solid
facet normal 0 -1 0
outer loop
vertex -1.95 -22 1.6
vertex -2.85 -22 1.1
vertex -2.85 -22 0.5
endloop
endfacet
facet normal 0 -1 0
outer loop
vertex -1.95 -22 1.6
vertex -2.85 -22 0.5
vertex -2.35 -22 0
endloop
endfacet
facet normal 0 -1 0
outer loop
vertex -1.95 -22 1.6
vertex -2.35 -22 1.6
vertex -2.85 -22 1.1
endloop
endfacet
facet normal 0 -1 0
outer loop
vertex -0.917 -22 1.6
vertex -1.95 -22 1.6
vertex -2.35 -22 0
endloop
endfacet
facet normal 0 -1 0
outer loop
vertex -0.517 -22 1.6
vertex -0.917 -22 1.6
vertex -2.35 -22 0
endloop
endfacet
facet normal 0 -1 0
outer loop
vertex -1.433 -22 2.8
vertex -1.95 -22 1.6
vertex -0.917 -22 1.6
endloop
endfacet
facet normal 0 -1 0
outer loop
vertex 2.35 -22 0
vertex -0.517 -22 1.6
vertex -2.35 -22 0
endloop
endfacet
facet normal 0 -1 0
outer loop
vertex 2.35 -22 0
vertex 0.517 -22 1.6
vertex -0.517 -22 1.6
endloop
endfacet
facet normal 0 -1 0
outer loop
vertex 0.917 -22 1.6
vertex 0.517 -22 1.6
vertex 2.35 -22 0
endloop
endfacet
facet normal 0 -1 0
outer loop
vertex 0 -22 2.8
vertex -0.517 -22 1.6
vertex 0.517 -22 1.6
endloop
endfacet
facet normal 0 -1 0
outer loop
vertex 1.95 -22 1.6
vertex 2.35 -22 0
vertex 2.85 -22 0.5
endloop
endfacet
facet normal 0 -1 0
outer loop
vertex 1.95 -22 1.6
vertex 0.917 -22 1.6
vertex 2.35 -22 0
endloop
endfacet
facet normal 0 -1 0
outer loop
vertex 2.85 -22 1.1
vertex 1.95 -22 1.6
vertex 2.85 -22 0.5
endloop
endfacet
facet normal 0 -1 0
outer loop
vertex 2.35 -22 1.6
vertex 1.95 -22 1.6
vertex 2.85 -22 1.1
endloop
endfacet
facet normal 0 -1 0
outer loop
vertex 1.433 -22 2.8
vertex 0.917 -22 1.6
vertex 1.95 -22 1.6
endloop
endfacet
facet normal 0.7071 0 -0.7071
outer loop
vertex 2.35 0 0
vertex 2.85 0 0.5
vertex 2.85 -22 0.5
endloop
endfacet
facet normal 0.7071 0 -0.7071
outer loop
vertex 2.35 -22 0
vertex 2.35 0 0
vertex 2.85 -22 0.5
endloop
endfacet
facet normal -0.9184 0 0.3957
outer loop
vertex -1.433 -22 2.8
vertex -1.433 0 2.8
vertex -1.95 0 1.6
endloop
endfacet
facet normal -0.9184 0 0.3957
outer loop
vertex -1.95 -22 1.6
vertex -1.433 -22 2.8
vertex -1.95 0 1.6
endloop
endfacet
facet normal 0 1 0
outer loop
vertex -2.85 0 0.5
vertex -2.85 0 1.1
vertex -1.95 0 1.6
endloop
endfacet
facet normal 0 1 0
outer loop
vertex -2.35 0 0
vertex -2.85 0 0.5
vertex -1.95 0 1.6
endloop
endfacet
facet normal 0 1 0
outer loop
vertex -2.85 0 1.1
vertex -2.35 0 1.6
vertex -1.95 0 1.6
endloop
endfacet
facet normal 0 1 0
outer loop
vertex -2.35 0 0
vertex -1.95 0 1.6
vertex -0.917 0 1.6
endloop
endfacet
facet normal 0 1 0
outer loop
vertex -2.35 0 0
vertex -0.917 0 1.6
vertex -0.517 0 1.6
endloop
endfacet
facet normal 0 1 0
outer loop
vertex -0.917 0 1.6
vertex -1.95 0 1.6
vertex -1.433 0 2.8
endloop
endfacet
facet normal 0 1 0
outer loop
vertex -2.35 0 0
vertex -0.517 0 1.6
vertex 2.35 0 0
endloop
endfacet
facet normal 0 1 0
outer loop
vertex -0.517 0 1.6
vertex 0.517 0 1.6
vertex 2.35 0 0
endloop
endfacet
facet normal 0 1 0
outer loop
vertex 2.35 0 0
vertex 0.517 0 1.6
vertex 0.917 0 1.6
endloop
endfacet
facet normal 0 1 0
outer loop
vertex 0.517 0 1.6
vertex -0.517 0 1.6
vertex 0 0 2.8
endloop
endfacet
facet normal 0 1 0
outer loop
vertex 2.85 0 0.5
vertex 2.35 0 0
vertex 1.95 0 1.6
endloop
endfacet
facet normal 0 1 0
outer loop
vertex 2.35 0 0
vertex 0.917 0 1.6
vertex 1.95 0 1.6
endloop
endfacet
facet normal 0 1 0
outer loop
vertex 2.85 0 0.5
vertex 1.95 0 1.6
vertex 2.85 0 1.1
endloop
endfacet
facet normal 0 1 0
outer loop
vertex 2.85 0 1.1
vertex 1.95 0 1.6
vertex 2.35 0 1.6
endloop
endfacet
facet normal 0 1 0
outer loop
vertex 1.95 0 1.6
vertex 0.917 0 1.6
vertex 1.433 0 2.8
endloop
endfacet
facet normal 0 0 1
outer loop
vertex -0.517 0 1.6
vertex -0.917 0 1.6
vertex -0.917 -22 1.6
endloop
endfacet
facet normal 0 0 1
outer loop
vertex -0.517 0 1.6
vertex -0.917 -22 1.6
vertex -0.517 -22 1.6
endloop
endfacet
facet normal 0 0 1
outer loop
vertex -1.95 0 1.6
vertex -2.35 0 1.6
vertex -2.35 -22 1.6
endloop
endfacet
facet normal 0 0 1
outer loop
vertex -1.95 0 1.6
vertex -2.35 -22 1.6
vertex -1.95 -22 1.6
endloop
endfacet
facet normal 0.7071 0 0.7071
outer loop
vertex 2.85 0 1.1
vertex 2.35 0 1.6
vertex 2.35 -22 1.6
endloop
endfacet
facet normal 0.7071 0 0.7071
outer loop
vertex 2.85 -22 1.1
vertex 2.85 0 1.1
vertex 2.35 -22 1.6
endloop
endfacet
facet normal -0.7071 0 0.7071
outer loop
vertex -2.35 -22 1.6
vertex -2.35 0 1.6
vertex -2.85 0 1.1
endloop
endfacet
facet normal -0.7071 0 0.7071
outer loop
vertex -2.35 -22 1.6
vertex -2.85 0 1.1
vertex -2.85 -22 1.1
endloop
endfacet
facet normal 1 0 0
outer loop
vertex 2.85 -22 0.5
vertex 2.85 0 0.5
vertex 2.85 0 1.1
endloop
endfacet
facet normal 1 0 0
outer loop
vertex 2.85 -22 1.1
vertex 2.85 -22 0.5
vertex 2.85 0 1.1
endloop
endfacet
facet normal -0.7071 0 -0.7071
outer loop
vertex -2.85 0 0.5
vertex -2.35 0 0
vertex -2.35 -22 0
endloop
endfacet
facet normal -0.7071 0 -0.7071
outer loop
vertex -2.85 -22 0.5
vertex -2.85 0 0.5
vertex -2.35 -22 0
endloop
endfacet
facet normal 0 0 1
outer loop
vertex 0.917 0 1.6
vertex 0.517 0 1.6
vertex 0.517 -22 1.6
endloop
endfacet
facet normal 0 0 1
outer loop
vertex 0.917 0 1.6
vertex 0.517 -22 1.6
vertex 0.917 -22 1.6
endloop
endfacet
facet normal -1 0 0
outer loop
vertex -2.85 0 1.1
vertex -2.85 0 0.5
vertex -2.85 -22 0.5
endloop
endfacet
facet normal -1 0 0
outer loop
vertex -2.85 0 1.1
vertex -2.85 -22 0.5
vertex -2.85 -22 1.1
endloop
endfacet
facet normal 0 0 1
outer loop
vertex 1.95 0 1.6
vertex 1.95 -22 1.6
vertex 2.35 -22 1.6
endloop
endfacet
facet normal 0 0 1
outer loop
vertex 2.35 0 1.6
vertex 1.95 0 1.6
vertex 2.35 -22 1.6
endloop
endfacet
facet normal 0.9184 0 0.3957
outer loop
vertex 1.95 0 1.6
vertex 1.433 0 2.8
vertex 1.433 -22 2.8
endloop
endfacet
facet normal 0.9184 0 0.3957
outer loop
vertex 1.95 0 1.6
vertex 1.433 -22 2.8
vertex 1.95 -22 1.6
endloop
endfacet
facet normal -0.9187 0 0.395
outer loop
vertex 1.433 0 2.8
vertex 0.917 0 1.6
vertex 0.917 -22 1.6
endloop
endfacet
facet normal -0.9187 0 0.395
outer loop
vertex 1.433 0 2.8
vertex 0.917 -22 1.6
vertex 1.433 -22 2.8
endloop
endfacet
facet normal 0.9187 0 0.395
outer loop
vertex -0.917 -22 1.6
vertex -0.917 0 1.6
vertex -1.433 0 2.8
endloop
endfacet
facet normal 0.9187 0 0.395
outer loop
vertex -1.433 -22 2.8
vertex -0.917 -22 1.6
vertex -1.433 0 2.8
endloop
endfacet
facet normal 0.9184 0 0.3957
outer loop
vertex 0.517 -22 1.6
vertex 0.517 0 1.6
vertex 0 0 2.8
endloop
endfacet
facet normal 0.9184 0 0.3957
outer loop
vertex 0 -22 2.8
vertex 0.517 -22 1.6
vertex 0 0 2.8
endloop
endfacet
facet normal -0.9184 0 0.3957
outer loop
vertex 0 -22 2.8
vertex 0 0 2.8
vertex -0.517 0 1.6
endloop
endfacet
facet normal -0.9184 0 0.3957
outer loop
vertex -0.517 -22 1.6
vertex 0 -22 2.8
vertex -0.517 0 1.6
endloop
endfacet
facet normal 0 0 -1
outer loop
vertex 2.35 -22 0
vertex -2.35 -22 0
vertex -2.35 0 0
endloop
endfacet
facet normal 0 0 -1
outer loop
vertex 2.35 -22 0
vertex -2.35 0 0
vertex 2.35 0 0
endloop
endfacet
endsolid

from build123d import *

# Parameters (mm, degrees)
SKETCH014_W     = 5.7
SKETCH014_H     = 1.6
PAD004_DEPTH    = 22
PAD005_DEPTH    = 22
CHAMFER002_SIZE = 0.5


with BuildPart() as part:
    # Sketch014 → Pad004 (new body)
    with BuildSketch(Plane.XZ):
        with Locations((0, 0.8)):
            Rectangle(SKETCH014_W, SKETCH014_H)
    extrude(amount=PAD004_DEPTH)

    # Sketch015 → Pad005 (join)
    with BuildSketch(Plane.XZ):
        Polygon((0.516667, 1.6), (0, 2.8), (-0.516667, 1.6), align=None)
        Polygon((-0.916667, 1.6), (-1.433333, 2.8), (-1.95, 1.6), align=None)
        Polygon((0.916667, 1.6), (1.433333, 2.8), (1.95, 1.6), align=None)
    extrude(amount=PAD005_DEPTH)

    # Chamfer002
    chamfer002_edges = [part.edges().sort_by_distance(p)[0] for p in [
        (-2.85, -11, 1.6),
        (-2.85, -11, 0),
        (2.85, -11, 0),
        (2.85, -11, 1.6),
    ]]
    chamfer(chamfer002_edges, length=CHAMFER002_SIZE)


solid = part.part
